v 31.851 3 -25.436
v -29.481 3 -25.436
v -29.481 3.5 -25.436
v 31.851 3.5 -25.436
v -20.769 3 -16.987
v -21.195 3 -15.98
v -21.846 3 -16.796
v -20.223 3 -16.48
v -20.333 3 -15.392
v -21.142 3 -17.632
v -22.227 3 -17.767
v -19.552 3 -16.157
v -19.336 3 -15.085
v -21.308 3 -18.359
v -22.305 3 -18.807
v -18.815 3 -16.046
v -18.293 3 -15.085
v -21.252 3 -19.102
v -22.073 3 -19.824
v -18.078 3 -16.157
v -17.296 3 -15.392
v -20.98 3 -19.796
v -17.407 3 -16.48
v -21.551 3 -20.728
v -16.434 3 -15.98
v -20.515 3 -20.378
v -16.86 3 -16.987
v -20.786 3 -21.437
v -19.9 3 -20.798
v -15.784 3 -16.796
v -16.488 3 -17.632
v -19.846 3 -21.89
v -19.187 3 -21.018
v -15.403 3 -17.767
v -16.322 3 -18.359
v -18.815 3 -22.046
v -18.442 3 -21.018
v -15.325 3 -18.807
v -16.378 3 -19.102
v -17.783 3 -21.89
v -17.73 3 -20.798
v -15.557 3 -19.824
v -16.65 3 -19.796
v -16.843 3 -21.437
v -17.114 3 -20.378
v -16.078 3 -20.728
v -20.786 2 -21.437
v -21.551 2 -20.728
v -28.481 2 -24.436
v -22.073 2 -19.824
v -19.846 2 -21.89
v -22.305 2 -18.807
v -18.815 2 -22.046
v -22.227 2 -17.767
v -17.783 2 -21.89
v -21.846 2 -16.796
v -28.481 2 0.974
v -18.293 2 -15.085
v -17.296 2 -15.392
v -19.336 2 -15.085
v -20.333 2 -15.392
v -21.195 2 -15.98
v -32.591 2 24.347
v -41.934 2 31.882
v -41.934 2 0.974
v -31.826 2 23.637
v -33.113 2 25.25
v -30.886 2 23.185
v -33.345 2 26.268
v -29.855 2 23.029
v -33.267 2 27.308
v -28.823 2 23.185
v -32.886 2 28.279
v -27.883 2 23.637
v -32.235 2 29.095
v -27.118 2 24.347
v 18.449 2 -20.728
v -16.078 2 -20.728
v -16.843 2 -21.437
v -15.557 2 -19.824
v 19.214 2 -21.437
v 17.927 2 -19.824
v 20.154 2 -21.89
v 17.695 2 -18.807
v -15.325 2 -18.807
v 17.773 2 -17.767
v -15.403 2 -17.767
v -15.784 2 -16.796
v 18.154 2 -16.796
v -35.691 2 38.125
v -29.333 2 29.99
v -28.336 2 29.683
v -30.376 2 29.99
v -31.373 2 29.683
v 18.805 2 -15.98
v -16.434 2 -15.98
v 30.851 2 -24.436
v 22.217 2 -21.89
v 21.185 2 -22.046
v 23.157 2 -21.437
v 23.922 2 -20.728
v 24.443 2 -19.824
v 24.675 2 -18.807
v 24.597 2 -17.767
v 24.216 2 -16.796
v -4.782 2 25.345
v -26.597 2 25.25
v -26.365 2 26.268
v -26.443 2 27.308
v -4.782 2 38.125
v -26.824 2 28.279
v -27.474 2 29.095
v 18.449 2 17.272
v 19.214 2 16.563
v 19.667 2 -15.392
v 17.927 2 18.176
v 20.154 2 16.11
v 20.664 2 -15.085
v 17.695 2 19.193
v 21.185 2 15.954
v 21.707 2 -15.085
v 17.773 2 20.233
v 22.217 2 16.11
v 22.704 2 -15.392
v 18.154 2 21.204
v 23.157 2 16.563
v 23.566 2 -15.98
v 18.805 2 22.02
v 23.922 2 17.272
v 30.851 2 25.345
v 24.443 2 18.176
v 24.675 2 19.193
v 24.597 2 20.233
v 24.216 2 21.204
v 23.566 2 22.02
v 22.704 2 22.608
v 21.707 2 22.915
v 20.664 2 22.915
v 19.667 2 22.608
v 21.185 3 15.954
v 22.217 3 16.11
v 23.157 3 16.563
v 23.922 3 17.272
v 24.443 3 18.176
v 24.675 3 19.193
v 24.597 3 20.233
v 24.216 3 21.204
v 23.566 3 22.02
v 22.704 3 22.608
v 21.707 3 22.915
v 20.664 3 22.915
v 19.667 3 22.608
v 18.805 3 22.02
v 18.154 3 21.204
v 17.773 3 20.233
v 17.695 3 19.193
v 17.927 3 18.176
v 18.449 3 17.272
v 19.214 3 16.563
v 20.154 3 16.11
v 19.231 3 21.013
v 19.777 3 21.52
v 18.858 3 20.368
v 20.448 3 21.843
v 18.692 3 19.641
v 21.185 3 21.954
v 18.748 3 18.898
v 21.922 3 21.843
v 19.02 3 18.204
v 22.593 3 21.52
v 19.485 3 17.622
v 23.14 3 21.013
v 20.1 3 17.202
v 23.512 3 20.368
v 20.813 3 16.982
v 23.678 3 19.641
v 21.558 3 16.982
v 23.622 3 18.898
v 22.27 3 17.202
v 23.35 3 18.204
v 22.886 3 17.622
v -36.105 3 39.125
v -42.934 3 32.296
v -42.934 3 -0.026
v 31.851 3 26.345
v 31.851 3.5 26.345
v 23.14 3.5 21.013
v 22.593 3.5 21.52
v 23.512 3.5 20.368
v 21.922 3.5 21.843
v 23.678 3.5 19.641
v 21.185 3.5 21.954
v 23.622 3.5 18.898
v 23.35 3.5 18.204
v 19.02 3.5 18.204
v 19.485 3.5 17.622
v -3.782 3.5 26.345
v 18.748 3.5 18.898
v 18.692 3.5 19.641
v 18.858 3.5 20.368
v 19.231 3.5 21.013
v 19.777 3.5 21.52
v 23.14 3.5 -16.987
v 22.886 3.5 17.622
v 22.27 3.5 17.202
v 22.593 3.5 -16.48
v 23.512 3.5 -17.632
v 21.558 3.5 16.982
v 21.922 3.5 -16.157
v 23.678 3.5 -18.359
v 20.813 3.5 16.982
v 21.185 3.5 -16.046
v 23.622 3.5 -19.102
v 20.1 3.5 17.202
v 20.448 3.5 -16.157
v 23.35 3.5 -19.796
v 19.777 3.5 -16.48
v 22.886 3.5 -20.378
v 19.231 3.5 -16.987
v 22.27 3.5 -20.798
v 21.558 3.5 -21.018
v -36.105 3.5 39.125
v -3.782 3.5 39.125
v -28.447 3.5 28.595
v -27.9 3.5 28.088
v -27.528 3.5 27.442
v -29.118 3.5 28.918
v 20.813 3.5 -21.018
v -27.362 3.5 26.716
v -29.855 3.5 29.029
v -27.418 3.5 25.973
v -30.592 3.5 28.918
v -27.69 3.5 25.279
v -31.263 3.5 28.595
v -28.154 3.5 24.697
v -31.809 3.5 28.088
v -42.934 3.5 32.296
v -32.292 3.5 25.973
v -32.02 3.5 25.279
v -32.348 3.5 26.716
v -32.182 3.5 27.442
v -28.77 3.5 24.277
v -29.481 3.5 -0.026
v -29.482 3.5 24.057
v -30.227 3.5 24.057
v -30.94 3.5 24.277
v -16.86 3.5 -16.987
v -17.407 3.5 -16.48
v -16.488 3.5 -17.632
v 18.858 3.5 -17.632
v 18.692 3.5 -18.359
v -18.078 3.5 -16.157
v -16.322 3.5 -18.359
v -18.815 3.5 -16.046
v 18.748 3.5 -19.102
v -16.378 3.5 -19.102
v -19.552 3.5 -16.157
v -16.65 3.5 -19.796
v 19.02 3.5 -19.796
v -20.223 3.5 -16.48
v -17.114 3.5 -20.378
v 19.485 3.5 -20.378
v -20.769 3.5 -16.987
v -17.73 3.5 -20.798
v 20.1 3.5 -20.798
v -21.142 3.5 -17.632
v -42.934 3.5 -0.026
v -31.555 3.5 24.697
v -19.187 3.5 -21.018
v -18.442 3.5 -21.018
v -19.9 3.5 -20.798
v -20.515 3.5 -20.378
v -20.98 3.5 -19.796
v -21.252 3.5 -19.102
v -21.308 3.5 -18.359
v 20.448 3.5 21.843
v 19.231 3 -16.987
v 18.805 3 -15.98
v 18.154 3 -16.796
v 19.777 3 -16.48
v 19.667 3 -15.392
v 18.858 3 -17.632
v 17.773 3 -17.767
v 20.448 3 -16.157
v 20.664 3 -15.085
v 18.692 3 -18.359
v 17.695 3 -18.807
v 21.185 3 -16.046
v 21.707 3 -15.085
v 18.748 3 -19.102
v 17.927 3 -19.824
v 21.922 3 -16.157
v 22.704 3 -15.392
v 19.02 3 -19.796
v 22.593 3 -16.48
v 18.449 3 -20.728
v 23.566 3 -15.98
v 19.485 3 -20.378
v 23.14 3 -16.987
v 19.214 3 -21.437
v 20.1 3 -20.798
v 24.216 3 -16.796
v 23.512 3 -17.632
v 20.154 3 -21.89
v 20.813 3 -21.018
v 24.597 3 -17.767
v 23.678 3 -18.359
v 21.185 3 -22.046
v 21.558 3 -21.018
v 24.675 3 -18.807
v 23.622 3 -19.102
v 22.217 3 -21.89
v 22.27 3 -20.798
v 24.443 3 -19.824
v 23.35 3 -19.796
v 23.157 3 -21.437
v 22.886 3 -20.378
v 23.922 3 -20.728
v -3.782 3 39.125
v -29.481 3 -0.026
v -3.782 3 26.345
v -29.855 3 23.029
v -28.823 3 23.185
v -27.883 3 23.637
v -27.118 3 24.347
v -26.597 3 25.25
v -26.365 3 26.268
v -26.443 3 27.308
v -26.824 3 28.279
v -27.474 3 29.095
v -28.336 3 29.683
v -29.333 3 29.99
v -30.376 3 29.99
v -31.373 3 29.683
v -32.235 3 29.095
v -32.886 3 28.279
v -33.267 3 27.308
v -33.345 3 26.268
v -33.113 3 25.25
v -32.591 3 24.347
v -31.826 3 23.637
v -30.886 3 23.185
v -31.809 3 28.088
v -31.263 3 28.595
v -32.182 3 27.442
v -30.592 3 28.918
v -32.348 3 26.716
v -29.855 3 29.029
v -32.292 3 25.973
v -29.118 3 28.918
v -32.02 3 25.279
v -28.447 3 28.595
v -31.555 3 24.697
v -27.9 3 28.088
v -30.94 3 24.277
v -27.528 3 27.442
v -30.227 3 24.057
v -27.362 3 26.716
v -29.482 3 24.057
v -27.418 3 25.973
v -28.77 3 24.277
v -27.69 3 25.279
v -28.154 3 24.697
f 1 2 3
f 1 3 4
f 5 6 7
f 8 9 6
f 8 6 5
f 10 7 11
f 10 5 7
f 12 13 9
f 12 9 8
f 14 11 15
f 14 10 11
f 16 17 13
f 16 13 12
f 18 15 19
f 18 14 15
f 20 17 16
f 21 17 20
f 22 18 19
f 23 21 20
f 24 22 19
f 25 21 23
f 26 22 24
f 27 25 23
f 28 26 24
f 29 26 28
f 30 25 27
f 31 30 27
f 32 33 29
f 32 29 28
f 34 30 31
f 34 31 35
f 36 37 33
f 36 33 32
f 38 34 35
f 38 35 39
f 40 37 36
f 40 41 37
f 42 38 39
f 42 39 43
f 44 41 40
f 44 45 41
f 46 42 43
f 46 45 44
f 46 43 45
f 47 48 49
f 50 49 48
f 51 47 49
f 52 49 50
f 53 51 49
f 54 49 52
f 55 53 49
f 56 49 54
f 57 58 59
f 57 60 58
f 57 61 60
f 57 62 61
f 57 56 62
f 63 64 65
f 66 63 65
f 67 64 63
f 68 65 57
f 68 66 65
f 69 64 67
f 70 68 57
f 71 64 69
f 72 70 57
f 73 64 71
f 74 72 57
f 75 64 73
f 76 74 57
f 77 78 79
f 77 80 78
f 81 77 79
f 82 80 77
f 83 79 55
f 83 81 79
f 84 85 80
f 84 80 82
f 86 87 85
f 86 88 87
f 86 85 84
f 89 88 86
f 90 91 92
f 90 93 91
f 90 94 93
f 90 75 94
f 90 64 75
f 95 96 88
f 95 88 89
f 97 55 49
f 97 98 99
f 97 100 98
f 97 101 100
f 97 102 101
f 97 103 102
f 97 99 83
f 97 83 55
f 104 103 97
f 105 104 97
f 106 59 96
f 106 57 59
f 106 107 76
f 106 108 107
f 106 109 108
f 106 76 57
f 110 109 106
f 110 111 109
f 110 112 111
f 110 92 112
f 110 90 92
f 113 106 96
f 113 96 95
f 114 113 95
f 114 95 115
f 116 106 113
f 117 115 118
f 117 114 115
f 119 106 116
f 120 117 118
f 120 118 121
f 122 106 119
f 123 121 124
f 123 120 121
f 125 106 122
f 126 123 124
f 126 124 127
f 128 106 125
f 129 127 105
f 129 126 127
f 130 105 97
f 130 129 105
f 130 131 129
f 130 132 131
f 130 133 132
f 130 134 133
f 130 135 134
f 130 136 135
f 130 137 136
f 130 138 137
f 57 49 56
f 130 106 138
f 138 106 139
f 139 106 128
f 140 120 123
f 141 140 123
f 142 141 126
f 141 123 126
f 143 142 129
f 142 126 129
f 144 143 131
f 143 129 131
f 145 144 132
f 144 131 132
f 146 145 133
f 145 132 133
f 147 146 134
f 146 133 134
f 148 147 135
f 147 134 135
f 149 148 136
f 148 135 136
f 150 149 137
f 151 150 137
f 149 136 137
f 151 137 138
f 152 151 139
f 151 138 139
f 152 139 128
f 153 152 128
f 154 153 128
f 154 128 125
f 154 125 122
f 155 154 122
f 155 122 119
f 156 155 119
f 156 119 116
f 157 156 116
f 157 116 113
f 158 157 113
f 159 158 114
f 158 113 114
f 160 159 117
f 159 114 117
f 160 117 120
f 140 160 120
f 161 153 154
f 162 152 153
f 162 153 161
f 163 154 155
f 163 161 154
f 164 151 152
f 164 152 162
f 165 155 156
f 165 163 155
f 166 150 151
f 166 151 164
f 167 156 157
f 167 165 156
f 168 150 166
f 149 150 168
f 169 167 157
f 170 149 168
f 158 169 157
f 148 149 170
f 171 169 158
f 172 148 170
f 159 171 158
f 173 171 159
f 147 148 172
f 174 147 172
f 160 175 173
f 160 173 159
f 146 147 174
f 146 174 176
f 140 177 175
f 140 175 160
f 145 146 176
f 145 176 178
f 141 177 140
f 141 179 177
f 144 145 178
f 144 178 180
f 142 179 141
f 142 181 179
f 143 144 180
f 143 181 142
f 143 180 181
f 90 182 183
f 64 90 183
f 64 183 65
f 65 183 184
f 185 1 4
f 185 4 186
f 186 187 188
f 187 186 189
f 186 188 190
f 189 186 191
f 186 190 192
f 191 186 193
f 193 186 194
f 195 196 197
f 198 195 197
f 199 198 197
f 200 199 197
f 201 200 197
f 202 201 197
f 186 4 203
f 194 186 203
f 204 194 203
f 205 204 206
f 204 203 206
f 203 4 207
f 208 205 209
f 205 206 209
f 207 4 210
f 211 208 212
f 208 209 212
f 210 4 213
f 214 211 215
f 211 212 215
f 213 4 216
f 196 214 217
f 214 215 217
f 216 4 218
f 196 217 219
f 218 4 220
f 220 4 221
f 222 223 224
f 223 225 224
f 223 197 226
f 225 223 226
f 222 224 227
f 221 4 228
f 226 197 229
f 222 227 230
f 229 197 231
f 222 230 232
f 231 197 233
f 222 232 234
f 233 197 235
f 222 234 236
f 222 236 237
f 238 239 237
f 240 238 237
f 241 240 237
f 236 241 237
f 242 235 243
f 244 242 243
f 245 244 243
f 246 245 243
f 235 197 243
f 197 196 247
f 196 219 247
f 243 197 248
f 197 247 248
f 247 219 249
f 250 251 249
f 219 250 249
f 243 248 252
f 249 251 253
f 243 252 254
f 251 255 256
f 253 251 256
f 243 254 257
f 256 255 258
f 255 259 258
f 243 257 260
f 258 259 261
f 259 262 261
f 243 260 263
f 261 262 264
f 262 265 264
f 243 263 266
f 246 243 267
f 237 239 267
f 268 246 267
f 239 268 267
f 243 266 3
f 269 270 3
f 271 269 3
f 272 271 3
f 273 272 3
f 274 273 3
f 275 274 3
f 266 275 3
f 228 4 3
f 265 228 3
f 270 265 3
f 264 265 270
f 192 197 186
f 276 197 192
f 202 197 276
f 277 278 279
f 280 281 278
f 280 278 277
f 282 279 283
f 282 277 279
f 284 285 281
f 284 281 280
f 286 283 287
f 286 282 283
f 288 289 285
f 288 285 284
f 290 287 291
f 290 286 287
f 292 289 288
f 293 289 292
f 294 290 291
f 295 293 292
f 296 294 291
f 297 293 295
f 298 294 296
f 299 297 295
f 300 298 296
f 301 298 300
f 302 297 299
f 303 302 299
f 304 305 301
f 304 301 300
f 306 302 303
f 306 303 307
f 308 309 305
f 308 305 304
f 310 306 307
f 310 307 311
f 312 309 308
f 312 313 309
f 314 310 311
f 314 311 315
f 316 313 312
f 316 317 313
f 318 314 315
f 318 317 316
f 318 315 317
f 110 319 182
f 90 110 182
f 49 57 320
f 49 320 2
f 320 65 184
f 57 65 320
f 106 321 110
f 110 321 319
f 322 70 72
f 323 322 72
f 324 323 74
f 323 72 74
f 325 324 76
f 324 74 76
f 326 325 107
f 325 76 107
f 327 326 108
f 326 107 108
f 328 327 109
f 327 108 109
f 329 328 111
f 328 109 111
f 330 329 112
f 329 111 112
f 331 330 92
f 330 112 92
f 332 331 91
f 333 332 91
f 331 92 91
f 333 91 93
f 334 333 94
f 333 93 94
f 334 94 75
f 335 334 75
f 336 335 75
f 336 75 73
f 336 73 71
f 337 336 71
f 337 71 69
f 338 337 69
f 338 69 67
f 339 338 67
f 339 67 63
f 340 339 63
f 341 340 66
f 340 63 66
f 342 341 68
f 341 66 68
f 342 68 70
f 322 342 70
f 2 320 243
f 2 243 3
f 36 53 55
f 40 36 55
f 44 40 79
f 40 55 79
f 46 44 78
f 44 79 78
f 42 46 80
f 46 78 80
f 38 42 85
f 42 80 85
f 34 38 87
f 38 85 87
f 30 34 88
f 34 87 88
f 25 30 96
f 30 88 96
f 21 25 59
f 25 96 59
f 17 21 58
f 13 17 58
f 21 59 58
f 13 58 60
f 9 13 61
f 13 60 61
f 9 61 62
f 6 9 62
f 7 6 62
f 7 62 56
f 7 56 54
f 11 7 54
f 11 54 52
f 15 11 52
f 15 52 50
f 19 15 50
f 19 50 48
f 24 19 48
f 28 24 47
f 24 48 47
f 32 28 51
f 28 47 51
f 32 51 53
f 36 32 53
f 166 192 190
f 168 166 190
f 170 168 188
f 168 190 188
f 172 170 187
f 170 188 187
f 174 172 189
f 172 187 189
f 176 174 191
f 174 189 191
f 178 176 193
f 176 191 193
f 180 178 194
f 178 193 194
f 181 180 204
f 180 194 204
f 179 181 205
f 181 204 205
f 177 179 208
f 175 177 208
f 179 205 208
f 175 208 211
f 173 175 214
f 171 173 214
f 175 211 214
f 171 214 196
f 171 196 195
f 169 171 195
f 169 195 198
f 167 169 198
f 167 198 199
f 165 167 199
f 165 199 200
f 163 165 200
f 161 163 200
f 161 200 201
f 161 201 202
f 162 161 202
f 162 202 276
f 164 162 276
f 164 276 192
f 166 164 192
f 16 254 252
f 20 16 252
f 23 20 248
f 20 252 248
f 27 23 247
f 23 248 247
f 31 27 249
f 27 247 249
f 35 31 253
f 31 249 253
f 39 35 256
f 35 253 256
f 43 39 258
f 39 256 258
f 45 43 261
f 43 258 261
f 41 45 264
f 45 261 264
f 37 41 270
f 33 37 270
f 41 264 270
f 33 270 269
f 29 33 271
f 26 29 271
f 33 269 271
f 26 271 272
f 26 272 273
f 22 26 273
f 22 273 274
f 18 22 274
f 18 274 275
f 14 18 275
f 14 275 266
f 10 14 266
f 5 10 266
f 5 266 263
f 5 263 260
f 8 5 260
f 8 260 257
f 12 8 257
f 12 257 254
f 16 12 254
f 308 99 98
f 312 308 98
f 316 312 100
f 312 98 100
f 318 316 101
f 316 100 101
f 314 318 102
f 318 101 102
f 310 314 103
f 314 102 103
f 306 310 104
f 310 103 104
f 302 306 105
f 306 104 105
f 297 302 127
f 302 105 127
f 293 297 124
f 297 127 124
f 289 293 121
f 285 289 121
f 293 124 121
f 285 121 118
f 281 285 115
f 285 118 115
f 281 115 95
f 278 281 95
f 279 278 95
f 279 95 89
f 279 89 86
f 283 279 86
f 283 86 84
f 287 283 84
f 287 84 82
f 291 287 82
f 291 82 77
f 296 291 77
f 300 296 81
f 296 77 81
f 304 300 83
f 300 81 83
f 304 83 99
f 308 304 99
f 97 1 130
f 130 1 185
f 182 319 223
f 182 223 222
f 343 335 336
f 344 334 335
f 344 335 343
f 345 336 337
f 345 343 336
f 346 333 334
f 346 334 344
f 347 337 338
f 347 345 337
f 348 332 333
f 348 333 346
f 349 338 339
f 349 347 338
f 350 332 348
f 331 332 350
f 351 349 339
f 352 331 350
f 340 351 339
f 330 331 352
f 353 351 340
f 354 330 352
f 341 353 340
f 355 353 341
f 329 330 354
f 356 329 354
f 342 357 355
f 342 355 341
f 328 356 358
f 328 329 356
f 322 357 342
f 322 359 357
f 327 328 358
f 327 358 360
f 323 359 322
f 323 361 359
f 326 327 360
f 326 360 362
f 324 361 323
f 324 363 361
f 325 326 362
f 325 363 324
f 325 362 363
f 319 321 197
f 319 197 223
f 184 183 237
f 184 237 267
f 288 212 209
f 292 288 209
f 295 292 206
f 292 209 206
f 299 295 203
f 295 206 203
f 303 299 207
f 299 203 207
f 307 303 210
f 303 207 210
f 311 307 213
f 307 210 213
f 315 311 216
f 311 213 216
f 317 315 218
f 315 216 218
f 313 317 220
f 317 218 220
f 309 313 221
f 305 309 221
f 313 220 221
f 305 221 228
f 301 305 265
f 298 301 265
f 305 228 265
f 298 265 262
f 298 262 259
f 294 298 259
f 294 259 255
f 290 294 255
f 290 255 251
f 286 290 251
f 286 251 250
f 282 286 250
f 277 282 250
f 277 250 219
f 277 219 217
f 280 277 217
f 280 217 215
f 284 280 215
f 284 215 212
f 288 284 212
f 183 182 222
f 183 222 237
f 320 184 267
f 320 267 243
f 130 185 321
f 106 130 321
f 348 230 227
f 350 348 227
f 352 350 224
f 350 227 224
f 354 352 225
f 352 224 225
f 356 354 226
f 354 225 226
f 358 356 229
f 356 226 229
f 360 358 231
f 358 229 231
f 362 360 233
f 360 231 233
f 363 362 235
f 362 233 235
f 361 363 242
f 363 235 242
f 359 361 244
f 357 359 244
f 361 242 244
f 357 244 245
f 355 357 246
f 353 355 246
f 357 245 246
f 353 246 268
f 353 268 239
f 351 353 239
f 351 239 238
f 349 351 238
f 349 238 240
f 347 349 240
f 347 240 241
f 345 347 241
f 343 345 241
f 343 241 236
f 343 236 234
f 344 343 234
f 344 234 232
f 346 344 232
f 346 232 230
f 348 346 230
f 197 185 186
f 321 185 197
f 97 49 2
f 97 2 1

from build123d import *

# Parameters (mm, degrees)
BOSS_EXTRUDE1_DEPTH = 2
CHAMFER1_SIZE       = 8
BOSS_EXTRUDE2_DEPTH = 1.5
SKETCH4_W           = 99.768826376
SKETCH4_H           = 91.588754032
CUT_EXTRUDE1_DEPTH  = 2
SKETCH5_R           = 2.5
CUT_EXTRUDE2_DEPTH  = 2
SKETCH6_R           = 3.5
CUT_EXTRUDE3_DEPTH  = 1
CHAMFER2_SIZE       = 1


with BuildPart() as part:
    # Sketch1 → Boss-Extrude1 (new body)
    with BuildSketch(Plane(origin=(0, 0, 0), x_dir=(1, 0, 0), z_dir=(0, 1, 0))):
        Polygon((-1.782487159, -28.34466675), (33.85093234, -28.34466675), (33.85093234, 27.435918205), (-31.480603593, 27.435918205), (-31.480603593, 2.026433414), (-44.933505709, 2.026433414), (-44.933505709, -41.124585136), (-1.782487159, -41.124585136), align=None)
    extrude(amount=BOSS_EXTRUDE1_DEPTH)

    # Chamfer1
    chamfer1_edges = [part.edges().sort_by_distance(p)[0] for p in [
        (-44.933505709, 1, 41.124585136),
    ]]
    chamfer(chamfer1_edges, length=CHAMFER1_SIZE)

    # Sketch3 → Boss-Extrude2 (add)
    with BuildSketch(Plane(origin=(0, 2, 0), x_dir=(1, 0, 0), z_dir=(0, 1, 0))):
        Polygon((-29.480603593, 25.435918205), (31.85093234, 25.435918205), (31.85093234, -26.34466675), (-3.782487159, -26.34466675), (-3.782487159, -39.124585136), (-36.105078585, -39.124585136), (-42.933505709, -32.296158012), (-42.933505709, 0.026433414), (-29.480603593, 0.026433414), align=None)
    extrude(amount=BOSS_EXTRUDE2_DEPTH)

    # Sketch4 → Cut-Extrude1 (cut)
    with BuildSketch(Plane.XZ):
        Rectangle(SKETCH4_W, SKETCH4_H)
    extrude(amount=-CUT_EXTRUDE1_DEPTH, mode=Mode.SUBTRACT)

    # Sketch5 → Cut-Extrude2 (cut)
    with BuildSketch(Plane(origin=(0, 3.5, 0), x_dir=(1, 0, 0), z_dir=(0, 1, 0))):
        with Locations(Location((-18.814835626, 18.545625727, 0), (0, 0, 270))):
            Circle(SKETCH5_R)
        with Locations(Location((21.185164374, 18.545625727, 0), (0, 0, 270))):
            Circle(SKETCH5_R)
        with Locations(Location((21.185164374, -19.454374273, 0), (0, 0, 270))):
            Circle(SKETCH5_R)
        with Locations(Location((-29.854835626, -26.529137879, 0), (0, 0, 270))):
            Circle(SKETCH5_R)
    extrude(amount=-CUT_EXTRUDE2_DEPTH, mode=Mode.SUBTRACT)

    # Sketch6 → Cut-Extrude3 (cut)
    with BuildSketch(Plane.XZ.offset(-2)):
        with Locations(Location((-29.854835626, 26.529137879, 0), (0, 0, 270))):
            Circle(SKETCH6_R)
        with Locations(Location((21.185164374, 19.454374273, 0), (0, 0, 270))):
            Circle(SKETCH6_R)
        with Locations(Location((-18.814835626, -18.545625727, 0), (0, 0, 270))):
            Circle(SKETCH6_R)
        with Locations(Location((21.185164374, -18.545625727, 0), (0, 0, 270))):
            Circle(SKETCH6_R)
    extrude(amount=-CUT_EXTRUDE3_DEPTH, mode=Mode.SUBTRACT)

    # Chamfer2
    chamfer2_edges = [part.edges().sort_by_distance(p)[0] for p in [
        (-29.480603593, 2, -12.731175809),
        (-36.207054651, 2, -0.026433414),
        (-42.933505709, 2, 16.134862299),
        (-39.519292147, 2, 35.710371574),
        (-19.943782872, 2, 39.124585136),
        (-3.782487159, 2, 32.734625943),
        (14.034222591, 2, 26.34466675),
        (31.85093234, 2, 0.454374273),
        (1.185164374, 2, -25.435918205),
    ]]
    chamfer(chamfer2_edges, length=CHAMFER2_SIZE)


solid = part.part
